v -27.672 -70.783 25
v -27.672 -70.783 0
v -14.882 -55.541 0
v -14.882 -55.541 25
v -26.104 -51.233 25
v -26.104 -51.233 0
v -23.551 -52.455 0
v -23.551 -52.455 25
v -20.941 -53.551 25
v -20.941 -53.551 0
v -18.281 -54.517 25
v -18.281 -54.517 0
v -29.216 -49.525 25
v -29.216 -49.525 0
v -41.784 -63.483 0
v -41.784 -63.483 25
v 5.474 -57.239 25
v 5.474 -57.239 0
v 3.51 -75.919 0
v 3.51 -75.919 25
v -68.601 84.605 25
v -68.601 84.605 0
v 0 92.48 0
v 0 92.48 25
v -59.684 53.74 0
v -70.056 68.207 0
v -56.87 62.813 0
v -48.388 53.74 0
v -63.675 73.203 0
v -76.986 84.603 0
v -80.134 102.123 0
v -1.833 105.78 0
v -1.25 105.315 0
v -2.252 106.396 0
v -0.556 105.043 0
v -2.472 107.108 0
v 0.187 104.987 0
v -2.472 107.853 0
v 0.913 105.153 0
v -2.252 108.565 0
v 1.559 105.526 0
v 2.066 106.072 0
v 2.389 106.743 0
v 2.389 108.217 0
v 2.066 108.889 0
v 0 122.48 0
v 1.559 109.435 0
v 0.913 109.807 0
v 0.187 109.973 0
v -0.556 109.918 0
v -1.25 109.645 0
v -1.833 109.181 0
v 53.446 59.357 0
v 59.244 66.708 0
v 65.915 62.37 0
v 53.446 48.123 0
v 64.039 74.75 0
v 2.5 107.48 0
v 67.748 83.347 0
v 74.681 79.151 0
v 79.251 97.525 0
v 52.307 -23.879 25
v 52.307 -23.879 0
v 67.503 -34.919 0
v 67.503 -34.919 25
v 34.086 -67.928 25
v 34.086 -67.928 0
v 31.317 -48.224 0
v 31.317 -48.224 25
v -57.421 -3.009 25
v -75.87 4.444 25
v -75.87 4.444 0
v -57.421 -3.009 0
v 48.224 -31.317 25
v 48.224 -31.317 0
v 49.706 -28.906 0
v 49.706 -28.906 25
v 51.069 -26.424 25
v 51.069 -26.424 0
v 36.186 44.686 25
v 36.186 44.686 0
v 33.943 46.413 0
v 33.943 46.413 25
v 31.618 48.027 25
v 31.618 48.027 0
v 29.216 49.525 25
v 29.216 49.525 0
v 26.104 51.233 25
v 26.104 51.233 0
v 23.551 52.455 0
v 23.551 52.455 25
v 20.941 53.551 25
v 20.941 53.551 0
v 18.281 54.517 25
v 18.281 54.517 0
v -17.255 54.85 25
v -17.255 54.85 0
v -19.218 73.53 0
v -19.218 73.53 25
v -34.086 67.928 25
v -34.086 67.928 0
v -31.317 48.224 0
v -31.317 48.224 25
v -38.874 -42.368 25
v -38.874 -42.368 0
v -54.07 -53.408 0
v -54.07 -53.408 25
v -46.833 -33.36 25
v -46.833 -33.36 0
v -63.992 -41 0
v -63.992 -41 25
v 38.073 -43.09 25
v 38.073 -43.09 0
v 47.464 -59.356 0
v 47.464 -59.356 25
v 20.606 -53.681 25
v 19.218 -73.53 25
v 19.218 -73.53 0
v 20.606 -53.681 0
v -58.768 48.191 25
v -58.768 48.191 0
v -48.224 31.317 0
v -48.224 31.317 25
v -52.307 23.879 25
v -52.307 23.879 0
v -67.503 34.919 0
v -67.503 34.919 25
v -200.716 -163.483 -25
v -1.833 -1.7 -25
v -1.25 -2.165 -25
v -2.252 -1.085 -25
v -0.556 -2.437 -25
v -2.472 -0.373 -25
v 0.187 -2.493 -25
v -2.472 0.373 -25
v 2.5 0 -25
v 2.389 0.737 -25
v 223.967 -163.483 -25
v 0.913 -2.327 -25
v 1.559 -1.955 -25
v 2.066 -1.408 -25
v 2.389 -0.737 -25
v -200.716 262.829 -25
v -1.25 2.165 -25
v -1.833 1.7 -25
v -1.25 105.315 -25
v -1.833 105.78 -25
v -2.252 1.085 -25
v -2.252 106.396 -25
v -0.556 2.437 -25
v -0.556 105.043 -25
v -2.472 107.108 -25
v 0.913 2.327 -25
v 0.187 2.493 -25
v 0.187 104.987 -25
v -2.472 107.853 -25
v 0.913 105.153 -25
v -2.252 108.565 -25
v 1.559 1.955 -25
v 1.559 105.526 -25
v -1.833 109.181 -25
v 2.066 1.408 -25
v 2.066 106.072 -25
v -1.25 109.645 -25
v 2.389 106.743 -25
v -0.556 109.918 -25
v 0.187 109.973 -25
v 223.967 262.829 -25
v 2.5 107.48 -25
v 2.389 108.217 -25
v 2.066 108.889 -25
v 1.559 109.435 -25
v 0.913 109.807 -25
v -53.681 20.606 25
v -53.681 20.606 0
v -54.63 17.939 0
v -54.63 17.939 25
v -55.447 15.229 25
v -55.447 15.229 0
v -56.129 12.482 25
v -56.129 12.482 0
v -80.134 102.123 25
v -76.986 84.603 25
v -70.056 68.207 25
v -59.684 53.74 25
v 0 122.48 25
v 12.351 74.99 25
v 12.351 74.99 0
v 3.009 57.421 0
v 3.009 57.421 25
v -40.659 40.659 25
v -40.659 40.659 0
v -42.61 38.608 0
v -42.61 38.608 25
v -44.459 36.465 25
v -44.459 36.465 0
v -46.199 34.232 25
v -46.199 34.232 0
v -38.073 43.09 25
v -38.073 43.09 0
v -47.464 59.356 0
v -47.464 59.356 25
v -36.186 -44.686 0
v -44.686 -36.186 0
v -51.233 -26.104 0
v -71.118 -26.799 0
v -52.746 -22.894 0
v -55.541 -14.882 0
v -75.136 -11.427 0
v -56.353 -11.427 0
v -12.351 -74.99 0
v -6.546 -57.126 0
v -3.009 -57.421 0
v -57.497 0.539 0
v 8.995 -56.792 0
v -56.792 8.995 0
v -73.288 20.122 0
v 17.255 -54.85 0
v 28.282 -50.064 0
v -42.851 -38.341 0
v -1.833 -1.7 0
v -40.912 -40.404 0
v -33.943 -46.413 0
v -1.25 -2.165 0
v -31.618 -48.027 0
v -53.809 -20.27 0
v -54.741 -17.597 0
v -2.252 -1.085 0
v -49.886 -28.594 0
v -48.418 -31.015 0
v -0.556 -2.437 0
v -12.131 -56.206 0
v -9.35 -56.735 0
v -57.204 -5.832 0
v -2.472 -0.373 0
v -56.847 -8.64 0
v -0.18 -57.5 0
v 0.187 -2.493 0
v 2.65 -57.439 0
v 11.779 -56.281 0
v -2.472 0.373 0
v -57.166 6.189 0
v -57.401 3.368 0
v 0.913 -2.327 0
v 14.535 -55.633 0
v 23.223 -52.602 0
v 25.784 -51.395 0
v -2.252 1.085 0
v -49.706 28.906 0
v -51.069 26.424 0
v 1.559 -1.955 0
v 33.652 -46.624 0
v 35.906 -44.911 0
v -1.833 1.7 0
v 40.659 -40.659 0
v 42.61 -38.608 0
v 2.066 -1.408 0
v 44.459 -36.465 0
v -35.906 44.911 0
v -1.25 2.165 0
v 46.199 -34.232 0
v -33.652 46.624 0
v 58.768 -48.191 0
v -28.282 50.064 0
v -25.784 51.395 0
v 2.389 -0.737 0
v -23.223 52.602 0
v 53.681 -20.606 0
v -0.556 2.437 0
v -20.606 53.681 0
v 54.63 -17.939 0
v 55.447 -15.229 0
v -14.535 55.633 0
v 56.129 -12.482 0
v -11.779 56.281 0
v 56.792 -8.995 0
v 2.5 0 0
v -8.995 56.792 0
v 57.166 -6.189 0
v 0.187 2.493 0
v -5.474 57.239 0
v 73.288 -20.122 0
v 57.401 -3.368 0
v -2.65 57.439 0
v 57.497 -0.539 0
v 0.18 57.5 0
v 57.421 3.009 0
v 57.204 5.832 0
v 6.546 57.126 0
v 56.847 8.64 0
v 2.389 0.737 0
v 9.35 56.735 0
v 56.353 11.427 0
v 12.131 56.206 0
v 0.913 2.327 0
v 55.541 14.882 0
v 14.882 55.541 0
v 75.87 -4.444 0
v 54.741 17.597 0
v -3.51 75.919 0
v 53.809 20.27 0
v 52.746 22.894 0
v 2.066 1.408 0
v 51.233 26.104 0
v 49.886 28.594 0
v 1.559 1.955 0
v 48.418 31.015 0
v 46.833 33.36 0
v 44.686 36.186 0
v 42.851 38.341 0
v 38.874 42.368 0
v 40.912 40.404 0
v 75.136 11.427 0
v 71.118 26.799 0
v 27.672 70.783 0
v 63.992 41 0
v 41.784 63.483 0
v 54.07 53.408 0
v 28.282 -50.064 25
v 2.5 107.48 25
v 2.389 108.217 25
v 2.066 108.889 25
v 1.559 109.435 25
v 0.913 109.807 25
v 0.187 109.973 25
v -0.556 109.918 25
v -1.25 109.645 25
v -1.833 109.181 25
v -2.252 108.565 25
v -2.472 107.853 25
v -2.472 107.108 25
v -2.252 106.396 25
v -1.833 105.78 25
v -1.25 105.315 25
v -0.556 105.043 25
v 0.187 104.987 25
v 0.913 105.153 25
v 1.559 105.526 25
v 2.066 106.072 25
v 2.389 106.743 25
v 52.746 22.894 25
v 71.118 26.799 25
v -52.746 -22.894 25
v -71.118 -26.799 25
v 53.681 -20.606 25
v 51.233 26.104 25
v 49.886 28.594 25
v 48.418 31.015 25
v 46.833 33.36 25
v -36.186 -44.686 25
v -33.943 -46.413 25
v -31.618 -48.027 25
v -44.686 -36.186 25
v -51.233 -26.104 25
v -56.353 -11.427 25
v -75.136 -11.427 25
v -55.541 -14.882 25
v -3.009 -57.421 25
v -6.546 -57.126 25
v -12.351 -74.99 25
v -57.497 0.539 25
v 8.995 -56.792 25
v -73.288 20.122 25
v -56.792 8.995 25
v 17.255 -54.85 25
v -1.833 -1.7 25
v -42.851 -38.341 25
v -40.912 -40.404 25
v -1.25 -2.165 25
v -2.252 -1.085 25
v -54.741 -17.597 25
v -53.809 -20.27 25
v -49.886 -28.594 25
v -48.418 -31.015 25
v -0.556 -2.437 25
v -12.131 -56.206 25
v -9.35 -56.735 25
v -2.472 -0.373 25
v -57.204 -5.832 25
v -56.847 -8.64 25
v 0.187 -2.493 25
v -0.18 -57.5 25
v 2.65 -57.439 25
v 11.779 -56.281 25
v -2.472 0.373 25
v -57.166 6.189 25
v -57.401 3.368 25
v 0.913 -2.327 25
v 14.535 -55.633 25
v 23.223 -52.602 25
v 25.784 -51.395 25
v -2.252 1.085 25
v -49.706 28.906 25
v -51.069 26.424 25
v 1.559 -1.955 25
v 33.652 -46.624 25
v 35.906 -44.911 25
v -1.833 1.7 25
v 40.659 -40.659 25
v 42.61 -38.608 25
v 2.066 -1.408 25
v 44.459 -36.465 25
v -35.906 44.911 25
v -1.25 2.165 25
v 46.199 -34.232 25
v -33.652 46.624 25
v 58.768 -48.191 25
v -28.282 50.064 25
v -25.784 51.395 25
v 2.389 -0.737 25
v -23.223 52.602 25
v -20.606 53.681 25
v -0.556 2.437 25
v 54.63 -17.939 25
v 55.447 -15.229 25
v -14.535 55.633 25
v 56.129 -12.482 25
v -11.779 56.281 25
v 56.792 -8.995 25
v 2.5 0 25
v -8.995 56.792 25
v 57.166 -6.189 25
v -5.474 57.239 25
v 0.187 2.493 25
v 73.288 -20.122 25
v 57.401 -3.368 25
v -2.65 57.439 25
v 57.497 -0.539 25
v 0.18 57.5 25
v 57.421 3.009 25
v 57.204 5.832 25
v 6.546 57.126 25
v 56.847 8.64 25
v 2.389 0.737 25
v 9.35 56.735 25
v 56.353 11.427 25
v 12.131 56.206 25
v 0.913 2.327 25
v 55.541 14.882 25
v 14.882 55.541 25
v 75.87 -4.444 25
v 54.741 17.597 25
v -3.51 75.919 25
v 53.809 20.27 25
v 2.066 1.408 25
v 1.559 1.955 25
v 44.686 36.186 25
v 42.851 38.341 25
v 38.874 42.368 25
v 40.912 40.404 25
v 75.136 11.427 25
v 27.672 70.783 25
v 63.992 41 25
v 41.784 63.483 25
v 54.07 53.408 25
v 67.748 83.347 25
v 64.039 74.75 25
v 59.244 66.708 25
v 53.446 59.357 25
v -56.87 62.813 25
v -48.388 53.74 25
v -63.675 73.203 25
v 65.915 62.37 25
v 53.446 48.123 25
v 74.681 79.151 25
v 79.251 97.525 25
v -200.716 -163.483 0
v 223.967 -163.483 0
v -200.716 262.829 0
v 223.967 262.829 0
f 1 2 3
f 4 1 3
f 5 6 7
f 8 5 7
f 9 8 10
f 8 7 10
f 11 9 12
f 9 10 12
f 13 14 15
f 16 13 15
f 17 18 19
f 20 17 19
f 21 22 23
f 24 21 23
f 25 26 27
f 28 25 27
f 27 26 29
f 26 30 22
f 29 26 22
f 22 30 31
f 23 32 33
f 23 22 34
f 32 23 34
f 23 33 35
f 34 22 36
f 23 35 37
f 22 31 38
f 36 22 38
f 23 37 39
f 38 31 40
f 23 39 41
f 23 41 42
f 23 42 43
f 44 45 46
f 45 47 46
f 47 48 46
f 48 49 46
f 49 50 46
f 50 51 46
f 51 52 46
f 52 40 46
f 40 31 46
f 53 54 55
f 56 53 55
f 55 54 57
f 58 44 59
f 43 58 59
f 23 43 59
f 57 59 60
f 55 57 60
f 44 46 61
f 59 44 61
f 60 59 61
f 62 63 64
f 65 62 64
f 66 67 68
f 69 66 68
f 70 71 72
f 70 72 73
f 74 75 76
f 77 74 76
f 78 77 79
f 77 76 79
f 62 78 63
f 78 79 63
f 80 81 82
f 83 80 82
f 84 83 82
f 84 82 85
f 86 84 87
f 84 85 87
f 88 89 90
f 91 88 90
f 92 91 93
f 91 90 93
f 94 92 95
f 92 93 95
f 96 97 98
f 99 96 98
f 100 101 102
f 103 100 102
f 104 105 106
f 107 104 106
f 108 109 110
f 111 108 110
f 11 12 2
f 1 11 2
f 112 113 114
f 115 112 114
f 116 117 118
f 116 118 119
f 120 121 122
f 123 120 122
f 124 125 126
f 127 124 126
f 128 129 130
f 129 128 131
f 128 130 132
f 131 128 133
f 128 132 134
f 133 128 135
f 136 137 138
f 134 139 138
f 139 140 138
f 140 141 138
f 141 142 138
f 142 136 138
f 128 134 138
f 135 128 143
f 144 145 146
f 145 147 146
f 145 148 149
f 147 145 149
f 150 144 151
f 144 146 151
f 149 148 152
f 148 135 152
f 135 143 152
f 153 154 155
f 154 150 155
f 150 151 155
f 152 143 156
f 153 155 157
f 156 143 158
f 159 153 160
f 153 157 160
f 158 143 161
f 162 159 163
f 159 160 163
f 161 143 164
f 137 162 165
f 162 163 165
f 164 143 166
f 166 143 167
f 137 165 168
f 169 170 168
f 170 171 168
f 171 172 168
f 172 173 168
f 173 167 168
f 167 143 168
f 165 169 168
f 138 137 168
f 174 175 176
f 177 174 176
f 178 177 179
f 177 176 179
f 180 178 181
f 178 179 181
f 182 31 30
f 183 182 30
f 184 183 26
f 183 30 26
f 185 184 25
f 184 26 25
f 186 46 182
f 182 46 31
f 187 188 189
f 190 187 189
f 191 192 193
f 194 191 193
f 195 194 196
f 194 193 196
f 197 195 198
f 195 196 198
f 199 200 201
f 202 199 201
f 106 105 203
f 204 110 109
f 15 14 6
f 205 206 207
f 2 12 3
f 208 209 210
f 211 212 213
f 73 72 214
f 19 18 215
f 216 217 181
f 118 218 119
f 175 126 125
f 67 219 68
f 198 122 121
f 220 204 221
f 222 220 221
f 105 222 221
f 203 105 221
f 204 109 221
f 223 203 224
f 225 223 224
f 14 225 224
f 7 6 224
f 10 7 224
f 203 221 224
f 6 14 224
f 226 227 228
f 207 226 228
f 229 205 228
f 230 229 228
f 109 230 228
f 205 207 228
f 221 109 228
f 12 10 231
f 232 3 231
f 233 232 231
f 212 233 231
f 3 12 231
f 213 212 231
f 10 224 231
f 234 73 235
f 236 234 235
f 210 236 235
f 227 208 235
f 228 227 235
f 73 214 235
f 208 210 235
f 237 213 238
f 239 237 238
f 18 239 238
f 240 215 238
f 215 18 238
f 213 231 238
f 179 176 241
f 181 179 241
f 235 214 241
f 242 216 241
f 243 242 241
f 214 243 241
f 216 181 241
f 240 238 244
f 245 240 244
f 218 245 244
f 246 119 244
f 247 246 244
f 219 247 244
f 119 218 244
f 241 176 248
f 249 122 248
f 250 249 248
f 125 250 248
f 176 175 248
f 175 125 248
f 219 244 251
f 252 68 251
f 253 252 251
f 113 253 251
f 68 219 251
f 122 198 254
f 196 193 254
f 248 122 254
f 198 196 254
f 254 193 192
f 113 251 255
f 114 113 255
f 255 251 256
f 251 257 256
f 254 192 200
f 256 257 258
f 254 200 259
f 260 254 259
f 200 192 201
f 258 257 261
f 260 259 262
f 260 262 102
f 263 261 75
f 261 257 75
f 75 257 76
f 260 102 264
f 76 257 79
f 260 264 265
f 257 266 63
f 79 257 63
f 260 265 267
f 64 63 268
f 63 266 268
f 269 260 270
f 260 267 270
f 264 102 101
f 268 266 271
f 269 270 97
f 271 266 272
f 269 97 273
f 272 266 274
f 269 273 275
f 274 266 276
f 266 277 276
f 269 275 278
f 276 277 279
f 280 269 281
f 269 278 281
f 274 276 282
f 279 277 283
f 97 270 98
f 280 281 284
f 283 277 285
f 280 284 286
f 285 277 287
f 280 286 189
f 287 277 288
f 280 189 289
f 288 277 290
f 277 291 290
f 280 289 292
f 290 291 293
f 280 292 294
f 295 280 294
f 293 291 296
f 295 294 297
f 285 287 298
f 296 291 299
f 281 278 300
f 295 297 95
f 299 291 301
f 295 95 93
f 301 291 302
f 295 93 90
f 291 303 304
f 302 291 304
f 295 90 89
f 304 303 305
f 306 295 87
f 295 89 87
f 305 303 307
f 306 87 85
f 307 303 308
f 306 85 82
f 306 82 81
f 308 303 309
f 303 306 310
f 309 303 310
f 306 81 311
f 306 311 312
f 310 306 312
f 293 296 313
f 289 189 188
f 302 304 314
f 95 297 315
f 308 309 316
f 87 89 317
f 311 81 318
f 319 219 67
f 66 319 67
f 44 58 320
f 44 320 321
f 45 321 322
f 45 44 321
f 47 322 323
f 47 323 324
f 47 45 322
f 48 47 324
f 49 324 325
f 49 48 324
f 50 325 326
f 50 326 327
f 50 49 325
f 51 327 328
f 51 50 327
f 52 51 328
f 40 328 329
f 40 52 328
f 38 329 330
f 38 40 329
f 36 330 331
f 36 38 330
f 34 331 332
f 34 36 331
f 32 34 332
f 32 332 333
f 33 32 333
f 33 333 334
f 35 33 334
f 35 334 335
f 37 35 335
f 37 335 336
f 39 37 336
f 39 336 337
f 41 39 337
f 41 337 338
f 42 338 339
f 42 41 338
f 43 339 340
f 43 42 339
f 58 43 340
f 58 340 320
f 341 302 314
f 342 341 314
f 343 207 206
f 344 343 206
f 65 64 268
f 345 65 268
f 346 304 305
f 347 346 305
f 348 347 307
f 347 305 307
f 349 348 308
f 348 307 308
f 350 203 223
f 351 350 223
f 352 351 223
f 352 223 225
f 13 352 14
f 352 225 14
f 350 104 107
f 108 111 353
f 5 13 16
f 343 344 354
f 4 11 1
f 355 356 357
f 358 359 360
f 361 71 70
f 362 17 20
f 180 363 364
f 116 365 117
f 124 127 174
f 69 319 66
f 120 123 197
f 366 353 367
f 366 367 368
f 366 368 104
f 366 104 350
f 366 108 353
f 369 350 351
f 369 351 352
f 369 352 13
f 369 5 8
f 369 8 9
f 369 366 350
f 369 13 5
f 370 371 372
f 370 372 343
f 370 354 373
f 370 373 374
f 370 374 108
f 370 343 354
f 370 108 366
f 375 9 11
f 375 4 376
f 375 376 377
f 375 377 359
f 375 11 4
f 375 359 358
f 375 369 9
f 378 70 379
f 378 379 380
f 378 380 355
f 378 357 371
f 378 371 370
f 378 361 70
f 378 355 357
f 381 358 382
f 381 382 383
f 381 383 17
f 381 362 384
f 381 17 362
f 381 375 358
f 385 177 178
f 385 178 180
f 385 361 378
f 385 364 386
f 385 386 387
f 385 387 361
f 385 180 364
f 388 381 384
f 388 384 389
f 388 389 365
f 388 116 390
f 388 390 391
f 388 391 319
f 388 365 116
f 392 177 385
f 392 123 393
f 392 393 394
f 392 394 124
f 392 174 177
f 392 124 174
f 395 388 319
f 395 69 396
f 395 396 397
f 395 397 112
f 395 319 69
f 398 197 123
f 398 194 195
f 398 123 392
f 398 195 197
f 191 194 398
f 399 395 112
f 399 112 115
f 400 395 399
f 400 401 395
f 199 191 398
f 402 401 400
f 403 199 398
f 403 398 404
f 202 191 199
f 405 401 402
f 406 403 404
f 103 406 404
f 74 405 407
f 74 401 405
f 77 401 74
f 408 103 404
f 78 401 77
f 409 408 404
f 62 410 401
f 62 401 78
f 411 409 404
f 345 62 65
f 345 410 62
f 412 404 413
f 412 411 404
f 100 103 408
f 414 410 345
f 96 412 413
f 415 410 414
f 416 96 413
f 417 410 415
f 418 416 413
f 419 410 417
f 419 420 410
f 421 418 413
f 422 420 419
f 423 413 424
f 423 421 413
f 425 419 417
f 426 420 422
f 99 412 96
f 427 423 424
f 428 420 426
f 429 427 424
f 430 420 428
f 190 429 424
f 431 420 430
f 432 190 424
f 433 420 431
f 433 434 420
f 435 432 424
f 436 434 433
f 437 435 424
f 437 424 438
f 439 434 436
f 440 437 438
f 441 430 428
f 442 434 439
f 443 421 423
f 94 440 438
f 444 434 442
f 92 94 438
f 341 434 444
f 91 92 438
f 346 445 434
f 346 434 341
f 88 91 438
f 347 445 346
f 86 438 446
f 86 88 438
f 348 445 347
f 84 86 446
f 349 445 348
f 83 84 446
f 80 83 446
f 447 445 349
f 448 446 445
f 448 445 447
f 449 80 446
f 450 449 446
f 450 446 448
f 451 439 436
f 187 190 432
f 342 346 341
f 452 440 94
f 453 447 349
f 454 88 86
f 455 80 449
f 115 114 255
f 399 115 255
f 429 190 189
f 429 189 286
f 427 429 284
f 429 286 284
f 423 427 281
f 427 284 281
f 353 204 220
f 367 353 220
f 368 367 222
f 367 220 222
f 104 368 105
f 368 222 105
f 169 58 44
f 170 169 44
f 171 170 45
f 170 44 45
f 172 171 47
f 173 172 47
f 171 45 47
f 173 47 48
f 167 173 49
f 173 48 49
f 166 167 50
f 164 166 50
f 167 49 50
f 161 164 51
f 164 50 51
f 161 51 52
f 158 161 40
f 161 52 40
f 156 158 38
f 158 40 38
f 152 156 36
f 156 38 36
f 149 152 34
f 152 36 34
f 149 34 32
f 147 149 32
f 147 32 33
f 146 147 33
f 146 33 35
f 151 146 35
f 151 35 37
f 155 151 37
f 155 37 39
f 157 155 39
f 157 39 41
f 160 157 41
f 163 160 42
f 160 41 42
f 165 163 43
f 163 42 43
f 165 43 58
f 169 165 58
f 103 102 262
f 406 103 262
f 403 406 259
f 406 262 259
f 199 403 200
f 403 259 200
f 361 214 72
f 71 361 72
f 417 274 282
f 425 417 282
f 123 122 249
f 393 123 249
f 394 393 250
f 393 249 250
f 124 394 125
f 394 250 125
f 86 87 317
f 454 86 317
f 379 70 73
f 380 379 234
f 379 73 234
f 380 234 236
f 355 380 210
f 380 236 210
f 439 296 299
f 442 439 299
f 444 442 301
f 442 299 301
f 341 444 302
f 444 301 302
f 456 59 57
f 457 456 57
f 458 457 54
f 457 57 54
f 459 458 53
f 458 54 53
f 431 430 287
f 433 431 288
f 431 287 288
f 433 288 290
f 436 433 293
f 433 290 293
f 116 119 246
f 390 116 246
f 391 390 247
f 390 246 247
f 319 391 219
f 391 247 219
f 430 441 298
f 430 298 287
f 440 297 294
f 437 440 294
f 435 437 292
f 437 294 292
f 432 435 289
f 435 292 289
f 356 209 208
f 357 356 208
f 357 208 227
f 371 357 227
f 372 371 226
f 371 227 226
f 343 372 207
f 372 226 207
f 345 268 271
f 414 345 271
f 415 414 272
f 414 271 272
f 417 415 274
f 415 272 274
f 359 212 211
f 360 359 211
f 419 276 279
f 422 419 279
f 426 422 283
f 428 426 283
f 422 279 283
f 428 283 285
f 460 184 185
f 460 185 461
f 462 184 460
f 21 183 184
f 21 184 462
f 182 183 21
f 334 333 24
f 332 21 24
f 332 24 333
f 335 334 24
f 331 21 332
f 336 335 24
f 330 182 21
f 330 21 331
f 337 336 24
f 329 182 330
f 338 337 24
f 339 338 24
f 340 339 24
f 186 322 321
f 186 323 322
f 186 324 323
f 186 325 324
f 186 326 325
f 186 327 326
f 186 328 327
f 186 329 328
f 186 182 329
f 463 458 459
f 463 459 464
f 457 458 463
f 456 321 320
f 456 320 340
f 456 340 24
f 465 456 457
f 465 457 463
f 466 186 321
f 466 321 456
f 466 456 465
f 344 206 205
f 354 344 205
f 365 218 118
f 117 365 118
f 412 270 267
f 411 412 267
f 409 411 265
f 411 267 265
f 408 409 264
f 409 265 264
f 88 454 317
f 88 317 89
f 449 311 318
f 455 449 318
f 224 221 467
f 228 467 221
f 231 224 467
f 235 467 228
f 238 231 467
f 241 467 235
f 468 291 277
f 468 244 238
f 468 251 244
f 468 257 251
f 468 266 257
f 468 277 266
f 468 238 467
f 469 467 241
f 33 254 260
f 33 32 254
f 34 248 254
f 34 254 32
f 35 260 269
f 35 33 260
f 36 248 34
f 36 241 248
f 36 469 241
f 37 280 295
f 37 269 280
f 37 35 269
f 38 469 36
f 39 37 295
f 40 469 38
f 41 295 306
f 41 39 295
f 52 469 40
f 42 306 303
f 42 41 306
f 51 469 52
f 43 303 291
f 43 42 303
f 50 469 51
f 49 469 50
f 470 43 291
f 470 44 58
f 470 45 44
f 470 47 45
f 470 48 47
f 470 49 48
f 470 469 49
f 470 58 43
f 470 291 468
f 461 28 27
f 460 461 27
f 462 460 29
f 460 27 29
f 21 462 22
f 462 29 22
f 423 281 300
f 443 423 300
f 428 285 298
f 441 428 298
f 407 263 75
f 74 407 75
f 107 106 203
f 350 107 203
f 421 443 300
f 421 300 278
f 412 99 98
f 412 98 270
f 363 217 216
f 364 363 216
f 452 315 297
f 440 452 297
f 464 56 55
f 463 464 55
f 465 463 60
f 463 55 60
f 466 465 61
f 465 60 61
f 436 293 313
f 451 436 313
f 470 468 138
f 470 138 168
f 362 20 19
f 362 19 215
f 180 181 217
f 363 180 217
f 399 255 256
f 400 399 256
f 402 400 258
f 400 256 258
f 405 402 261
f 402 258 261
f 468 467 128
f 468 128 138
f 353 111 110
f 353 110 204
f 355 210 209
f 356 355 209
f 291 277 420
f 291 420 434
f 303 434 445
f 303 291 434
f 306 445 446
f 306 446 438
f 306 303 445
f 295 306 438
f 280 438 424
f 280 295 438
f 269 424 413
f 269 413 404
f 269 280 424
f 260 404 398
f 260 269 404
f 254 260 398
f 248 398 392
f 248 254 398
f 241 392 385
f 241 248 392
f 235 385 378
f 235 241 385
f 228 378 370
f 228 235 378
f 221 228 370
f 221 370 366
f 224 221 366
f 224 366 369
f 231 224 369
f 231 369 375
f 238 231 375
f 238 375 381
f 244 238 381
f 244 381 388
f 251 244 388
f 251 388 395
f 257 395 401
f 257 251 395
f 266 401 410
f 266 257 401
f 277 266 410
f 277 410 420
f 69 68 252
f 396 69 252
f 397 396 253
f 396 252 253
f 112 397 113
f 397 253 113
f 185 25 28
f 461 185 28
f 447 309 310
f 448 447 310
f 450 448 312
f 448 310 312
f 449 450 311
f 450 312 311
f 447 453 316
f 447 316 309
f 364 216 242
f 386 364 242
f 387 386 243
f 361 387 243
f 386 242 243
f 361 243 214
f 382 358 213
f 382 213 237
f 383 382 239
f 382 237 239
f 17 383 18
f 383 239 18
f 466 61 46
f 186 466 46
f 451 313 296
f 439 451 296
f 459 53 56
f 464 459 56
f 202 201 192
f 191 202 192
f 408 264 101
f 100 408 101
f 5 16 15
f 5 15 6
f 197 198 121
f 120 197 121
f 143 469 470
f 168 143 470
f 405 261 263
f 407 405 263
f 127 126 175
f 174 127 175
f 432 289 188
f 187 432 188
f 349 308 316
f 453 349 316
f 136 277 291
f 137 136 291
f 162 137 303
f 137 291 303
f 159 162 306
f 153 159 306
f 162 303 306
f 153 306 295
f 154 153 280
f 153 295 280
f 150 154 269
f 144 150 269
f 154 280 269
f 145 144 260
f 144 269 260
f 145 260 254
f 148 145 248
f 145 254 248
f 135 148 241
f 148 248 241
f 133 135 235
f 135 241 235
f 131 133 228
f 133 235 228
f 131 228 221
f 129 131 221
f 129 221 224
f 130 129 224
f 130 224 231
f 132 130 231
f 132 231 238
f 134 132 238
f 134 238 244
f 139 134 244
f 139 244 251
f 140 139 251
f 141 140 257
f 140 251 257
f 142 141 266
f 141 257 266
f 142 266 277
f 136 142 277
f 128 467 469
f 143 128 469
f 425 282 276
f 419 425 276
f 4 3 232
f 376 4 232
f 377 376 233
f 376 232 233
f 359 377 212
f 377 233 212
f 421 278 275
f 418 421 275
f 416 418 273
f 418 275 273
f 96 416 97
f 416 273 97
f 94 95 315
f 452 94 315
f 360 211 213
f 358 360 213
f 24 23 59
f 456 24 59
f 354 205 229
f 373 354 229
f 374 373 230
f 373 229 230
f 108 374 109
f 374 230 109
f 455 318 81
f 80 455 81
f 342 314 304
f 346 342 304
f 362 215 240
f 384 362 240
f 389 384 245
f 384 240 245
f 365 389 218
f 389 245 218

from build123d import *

# Parameters (mm, degrees)
F0_R     = 2.5
F1_DEPTH = 25
F2_R     = 2.5
F3_DEPTH = 25
F4_W     = 424.682841
F4_H     = 426.312059
F4_R     = 2.5
F5_DEPTH = 25


with BuildPart() as f1:
    # F0 (on Top) → F1 (new body)
    with BuildSketch(Plane.XY):
        with BuildLine():
            Line((-75.869934, 4.444455), (-57.421198, -3.009317))
            ThreePointArc((-57.421198, -3.009317), (-57.042647, -7.237843), (-56.353134, -11.426913))
            Line((-56.353134, -11.426913), (-75.136048, -11.426913))
            Line((-75.136048, -11.426913), (-55.540735, -14.882095))
            ThreePointArc((-55.540735, -14.882095), (-54.291296, -18.939512), (-52.745894, -22.893683))
            Line((-52.745894, -22.893683), (-71.118356, -26.79887))
            Line((-71.118356, -26.79887), (-51.232875, -26.104454))
            ThreePointArc((-51.232875, -26.104454), (-49.167155, -29.813434), (-46.833405, -33.359889))
            Line((-46.833405, -33.359889), (-63.992451, -40.999588))
            Line((-63.992451, -40.999588), (-44.685893, -36.185922))
            ThreePointArc((-44.685893, -36.185922), (-41.894174, -39.384365), (-38.874072, -42.368107))
            Line((-38.874072, -42.368107), (-54.069769, -53.408427))
            Line((-54.069769, -53.408427), (-36.185922, -44.685893))
            ThreePointArc((-36.185922, -44.685893), (-32.790215, -47.234011), (-29.215755, -49.524637))
            Line((-29.215755, -49.524637), (-41.783978, -63.483062))
            Line((-41.783978, -63.483062), (-26.104454, -51.232875))
            ThreePointArc((-26.104454, -51.232875), (-22.253167, -53.019303), (-18.28057, -54.516702))
            Line((-18.28057, -54.516702), (-27.672027, -70.783182))
            Line((-27.672027, -70.783182), (-14.882095, -55.540735))
            ThreePointArc((-14.882095, -55.540735), (-10.743549, -56.487398), (-6.546436, -57.126125))
            Line((-6.546436, -57.126125), (-12.350676, -74.989738))
            Line((-12.350676, -74.989738), (-3.009317, -57.421198))
            ThreePointArc((-3.009317, -57.421198), (1.235613, -57.486722), (5.473808, -57.238863))
            Line((5.473808, -57.238863), (3.510459, -75.918882))
            Line((3.510459, -75.918882), (8.994982, -56.79208))
            ThreePointArc((8.994982, -56.79208), (13.160774, -55.973601), (17.254821, -54.849988))
            Line((17.254821, -54.849988), (19.218171, -73.530007))
            Line((19.218171, -73.530007), (20.606157, -53.680875))
            ThreePointArc((20.606157, -53.680875), (24.510746, -52.014165), (28.281716, -50.063905))
            Line((28.281716, -50.063905), (34.085955, -67.927518))
            Line((34.085955, -67.927518), (31.316745, -48.223558))
            ThreePointArc((31.316745, -48.223558), (34.78948, -45.78146), (38.072564, -43.089789))
            Line((38.072564, -43.089789), (47.464021, -59.35627))
            Line((47.464021, -59.35627), (40.65864, -40.65864))
            ThreePointArc((40.65864, -40.65864), (43.547747, -37.547886), (46.199458, -34.232443))
            Line((46.199458, -34.232443), (58.76768, -48.190868))
            Line((58.76768, -48.190868), (48.223558, -31.316745))
            ThreePointArc((48.223558, -31.316745), (50.402769, -27.673289), (52.307214, -23.878974))
            Line((52.307214, -23.878974), (67.50291, -34.919294))
            Line((67.50291, -34.919294), (53.680875, -20.606157))
            ThreePointArc((53.680875, -20.606157), (55.054948, -16.589236), (56.128893, -12.48188))
            Line((56.128893, -12.48188), (73.287939, -20.12158))
            Line((73.287939, -20.12158), (56.79208, -8.994982))
            ThreePointArc((56.79208, -8.994982), (57.300961, -4.780154), (57.497471, -0.539268))
            Line((57.497471, -0.539268), (75.869934, -4.444455))
            Line((75.869934, -4.444455), (57.421198, 3.009317))
            ThreePointArc((57.421198, 3.009317), (57.042647, 7.237843), (56.353134, 11.426913))
            Line((56.353134, 11.426913), (75.136048, 11.426913))
            Line((75.136048, 11.426913), (55.540735, 14.882095))
            ThreePointArc((55.540735, 14.882095), (54.291296, 18.939512), (52.745894, 22.893683))
            Line((52.745894, 22.893683), (71.118356, 26.79887))
            Line((71.118356, 26.79887), (51.232875, 26.104454))
            ThreePointArc((51.232875, 26.104454), (49.167155, 29.813434), (46.833405, 33.359889))
            Line((46.833405, 33.359889), (63.992451, 40.999588))
            Line((63.992451, 40.999588), (44.685893, 36.185922))
            ThreePointArc((44.685893, 36.185922), (41.894174, 39.384365), (38.874072, 42.368107))
            Line((38.874072, 42.368107), (54.069769, 53.408427))
            Line((54.069769, 53.408427), (36.185922, 44.685893))
            ThreePointArc((36.185922, 44.685893), (32.790215, 47.234011), (29.215755, 49.524637))
            Line((29.215755, 49.524637), (41.783978, 63.483062))
            Line((41.783978, 63.483062), (26.104454, 51.232875))
            ThreePointArc((26.104454, 51.232875), (22.253167, 53.019303), (18.28057, 54.516702))
            Line((18.28057, 54.516702), (27.672027, 70.783182))
            Line((27.672027, 70.783182), (14.882095, 55.540735))
            ThreePointArc((14.882095, 55.540735), (10.743549, 56.487398), (6.546436, 57.126125))
            Line((6.546436, 57.126125), (12.350676, 74.989738))
            Line((12.350676, 74.989738), (3.009317, 57.421198))
            ThreePointArc((3.009317, 57.421198), (-1.235613, 57.486722), (-5.473808, 57.238863))
            Line((-5.473808, 57.238863), (-3.510459, 75.918882))
            Line((-3.510459, 75.918882), (-8.994982, 56.79208))
            ThreePointArc((-8.994982, 56.79208), (-13.160774, 55.973601), (-17.254821, 54.849988))
            Line((-17.254821, 54.849988), (-19.218171, 73.530007))
            Line((-19.218171, 73.530007), (-20.606157, 53.680875))
            ThreePointArc((-20.606157, 53.680875), (-24.510746, 52.014165), (-28.281716, 50.063905))
            Line((-28.281716, 50.063905), (-34.085955, 67.927518))
            Line((-34.085955, 67.927518), (-31.316745, 48.223558))
            ThreePointArc((-31.316745, 48.223558), (-34.78948, 45.78146), (-38.072564, 43.089789))
            Line((-38.072564, 43.089789), (-47.464021, 59.35627))
            Line((-47.464021, 59.35627), (-40.65864, 40.65864))
            ThreePointArc((-40.65864, 40.65864), (-43.547747, 37.547886), (-46.199458, 34.232443))
            Line((-46.199458, 34.232443), (-58.76768, 48.190868))
            Line((-58.76768, 48.190868), (-48.223558, 31.316745))
            ThreePointArc((-48.223558, 31.316745), (-50.402769, 27.673289), (-52.307214, 23.878974))
            Line((-52.307214, 23.878974), (-67.50291, 34.919294))
            Line((-67.50291, 34.919294), (-53.680875, 20.606157))
            ThreePointArc((-53.680875, 20.606157), (-55.054948, 16.589236), (-56.128893, 12.48188))
            Line((-56.128893, 12.48188), (-73.287939, 20.12158))
            Line((-73.287939, 20.12158), (-56.79208, 8.994982))
            ThreePointArc((-56.79208, 8.994982), (-57.300961, 4.780154), (-57.497471, 0.539268))
            Line((-57.497471, 0.539268), (-75.869934, 4.444455))
        make_face()
        Circle(F0_R, mode=Mode.SUBTRACT)
    extrude(amount=F1_DEPTH)


with BuildPart() as f3:
    # F2 (on Top) → F3 (new body)
    with BuildSketch(Plane.XY):
        with BuildLine():
            ThreePointArc((-80.134451, 102.122741), (-73.976689, 76.212317), (-59.684445, 53.740115))
            Line((-59.684445, 53.740115), (-48.387817, 53.740115))
            ThreePointArc((-48.387817, 53.740115), (-60.495918, 67.86174), (-68.601024, 84.604908))
            Line((-68.601024, 84.604908), (0, 92.480231))
            Line((0, 92.480231), (67.748369, 83.347222))
            ThreePointArc((67.748369, 83.347222), (61.772799, 70.651371), (53.445721, 59.357487))
            Line((53.445721, 59.357487), (53.445721, 48.122744))
            ThreePointArc((53.445721, 48.122744), (70.796981, 70.499913), (79.250519, 97.524747))
            Line((79.250519, 97.524747), (0, 122.480231))
            Line((0, 122.480231), (-80.134451, 102.122741))
        make_face()
        with Locations((0, 107.480231)):
            Circle(F2_R, mode=Mode.SUBTRACT)
    extrude(amount=F3_DEPTH)


with BuildPart() as f5:
    # F4 (on Top) → F5 (new body)
    with BuildSketch(Plane.XY):
        with Locations((11.625298, 49.673393)):
            Rectangle(F4_W, F4_H)
        Circle(F4_R, mode=Mode.SUBTRACT)
        with Locations((0, 107.480231)):
            Circle(F4_R, mode=Mode.SUBTRACT)
    extrude(amount=-F5_DEPTH)


solid = Compound([f1.part, f3.part, f5.part])
